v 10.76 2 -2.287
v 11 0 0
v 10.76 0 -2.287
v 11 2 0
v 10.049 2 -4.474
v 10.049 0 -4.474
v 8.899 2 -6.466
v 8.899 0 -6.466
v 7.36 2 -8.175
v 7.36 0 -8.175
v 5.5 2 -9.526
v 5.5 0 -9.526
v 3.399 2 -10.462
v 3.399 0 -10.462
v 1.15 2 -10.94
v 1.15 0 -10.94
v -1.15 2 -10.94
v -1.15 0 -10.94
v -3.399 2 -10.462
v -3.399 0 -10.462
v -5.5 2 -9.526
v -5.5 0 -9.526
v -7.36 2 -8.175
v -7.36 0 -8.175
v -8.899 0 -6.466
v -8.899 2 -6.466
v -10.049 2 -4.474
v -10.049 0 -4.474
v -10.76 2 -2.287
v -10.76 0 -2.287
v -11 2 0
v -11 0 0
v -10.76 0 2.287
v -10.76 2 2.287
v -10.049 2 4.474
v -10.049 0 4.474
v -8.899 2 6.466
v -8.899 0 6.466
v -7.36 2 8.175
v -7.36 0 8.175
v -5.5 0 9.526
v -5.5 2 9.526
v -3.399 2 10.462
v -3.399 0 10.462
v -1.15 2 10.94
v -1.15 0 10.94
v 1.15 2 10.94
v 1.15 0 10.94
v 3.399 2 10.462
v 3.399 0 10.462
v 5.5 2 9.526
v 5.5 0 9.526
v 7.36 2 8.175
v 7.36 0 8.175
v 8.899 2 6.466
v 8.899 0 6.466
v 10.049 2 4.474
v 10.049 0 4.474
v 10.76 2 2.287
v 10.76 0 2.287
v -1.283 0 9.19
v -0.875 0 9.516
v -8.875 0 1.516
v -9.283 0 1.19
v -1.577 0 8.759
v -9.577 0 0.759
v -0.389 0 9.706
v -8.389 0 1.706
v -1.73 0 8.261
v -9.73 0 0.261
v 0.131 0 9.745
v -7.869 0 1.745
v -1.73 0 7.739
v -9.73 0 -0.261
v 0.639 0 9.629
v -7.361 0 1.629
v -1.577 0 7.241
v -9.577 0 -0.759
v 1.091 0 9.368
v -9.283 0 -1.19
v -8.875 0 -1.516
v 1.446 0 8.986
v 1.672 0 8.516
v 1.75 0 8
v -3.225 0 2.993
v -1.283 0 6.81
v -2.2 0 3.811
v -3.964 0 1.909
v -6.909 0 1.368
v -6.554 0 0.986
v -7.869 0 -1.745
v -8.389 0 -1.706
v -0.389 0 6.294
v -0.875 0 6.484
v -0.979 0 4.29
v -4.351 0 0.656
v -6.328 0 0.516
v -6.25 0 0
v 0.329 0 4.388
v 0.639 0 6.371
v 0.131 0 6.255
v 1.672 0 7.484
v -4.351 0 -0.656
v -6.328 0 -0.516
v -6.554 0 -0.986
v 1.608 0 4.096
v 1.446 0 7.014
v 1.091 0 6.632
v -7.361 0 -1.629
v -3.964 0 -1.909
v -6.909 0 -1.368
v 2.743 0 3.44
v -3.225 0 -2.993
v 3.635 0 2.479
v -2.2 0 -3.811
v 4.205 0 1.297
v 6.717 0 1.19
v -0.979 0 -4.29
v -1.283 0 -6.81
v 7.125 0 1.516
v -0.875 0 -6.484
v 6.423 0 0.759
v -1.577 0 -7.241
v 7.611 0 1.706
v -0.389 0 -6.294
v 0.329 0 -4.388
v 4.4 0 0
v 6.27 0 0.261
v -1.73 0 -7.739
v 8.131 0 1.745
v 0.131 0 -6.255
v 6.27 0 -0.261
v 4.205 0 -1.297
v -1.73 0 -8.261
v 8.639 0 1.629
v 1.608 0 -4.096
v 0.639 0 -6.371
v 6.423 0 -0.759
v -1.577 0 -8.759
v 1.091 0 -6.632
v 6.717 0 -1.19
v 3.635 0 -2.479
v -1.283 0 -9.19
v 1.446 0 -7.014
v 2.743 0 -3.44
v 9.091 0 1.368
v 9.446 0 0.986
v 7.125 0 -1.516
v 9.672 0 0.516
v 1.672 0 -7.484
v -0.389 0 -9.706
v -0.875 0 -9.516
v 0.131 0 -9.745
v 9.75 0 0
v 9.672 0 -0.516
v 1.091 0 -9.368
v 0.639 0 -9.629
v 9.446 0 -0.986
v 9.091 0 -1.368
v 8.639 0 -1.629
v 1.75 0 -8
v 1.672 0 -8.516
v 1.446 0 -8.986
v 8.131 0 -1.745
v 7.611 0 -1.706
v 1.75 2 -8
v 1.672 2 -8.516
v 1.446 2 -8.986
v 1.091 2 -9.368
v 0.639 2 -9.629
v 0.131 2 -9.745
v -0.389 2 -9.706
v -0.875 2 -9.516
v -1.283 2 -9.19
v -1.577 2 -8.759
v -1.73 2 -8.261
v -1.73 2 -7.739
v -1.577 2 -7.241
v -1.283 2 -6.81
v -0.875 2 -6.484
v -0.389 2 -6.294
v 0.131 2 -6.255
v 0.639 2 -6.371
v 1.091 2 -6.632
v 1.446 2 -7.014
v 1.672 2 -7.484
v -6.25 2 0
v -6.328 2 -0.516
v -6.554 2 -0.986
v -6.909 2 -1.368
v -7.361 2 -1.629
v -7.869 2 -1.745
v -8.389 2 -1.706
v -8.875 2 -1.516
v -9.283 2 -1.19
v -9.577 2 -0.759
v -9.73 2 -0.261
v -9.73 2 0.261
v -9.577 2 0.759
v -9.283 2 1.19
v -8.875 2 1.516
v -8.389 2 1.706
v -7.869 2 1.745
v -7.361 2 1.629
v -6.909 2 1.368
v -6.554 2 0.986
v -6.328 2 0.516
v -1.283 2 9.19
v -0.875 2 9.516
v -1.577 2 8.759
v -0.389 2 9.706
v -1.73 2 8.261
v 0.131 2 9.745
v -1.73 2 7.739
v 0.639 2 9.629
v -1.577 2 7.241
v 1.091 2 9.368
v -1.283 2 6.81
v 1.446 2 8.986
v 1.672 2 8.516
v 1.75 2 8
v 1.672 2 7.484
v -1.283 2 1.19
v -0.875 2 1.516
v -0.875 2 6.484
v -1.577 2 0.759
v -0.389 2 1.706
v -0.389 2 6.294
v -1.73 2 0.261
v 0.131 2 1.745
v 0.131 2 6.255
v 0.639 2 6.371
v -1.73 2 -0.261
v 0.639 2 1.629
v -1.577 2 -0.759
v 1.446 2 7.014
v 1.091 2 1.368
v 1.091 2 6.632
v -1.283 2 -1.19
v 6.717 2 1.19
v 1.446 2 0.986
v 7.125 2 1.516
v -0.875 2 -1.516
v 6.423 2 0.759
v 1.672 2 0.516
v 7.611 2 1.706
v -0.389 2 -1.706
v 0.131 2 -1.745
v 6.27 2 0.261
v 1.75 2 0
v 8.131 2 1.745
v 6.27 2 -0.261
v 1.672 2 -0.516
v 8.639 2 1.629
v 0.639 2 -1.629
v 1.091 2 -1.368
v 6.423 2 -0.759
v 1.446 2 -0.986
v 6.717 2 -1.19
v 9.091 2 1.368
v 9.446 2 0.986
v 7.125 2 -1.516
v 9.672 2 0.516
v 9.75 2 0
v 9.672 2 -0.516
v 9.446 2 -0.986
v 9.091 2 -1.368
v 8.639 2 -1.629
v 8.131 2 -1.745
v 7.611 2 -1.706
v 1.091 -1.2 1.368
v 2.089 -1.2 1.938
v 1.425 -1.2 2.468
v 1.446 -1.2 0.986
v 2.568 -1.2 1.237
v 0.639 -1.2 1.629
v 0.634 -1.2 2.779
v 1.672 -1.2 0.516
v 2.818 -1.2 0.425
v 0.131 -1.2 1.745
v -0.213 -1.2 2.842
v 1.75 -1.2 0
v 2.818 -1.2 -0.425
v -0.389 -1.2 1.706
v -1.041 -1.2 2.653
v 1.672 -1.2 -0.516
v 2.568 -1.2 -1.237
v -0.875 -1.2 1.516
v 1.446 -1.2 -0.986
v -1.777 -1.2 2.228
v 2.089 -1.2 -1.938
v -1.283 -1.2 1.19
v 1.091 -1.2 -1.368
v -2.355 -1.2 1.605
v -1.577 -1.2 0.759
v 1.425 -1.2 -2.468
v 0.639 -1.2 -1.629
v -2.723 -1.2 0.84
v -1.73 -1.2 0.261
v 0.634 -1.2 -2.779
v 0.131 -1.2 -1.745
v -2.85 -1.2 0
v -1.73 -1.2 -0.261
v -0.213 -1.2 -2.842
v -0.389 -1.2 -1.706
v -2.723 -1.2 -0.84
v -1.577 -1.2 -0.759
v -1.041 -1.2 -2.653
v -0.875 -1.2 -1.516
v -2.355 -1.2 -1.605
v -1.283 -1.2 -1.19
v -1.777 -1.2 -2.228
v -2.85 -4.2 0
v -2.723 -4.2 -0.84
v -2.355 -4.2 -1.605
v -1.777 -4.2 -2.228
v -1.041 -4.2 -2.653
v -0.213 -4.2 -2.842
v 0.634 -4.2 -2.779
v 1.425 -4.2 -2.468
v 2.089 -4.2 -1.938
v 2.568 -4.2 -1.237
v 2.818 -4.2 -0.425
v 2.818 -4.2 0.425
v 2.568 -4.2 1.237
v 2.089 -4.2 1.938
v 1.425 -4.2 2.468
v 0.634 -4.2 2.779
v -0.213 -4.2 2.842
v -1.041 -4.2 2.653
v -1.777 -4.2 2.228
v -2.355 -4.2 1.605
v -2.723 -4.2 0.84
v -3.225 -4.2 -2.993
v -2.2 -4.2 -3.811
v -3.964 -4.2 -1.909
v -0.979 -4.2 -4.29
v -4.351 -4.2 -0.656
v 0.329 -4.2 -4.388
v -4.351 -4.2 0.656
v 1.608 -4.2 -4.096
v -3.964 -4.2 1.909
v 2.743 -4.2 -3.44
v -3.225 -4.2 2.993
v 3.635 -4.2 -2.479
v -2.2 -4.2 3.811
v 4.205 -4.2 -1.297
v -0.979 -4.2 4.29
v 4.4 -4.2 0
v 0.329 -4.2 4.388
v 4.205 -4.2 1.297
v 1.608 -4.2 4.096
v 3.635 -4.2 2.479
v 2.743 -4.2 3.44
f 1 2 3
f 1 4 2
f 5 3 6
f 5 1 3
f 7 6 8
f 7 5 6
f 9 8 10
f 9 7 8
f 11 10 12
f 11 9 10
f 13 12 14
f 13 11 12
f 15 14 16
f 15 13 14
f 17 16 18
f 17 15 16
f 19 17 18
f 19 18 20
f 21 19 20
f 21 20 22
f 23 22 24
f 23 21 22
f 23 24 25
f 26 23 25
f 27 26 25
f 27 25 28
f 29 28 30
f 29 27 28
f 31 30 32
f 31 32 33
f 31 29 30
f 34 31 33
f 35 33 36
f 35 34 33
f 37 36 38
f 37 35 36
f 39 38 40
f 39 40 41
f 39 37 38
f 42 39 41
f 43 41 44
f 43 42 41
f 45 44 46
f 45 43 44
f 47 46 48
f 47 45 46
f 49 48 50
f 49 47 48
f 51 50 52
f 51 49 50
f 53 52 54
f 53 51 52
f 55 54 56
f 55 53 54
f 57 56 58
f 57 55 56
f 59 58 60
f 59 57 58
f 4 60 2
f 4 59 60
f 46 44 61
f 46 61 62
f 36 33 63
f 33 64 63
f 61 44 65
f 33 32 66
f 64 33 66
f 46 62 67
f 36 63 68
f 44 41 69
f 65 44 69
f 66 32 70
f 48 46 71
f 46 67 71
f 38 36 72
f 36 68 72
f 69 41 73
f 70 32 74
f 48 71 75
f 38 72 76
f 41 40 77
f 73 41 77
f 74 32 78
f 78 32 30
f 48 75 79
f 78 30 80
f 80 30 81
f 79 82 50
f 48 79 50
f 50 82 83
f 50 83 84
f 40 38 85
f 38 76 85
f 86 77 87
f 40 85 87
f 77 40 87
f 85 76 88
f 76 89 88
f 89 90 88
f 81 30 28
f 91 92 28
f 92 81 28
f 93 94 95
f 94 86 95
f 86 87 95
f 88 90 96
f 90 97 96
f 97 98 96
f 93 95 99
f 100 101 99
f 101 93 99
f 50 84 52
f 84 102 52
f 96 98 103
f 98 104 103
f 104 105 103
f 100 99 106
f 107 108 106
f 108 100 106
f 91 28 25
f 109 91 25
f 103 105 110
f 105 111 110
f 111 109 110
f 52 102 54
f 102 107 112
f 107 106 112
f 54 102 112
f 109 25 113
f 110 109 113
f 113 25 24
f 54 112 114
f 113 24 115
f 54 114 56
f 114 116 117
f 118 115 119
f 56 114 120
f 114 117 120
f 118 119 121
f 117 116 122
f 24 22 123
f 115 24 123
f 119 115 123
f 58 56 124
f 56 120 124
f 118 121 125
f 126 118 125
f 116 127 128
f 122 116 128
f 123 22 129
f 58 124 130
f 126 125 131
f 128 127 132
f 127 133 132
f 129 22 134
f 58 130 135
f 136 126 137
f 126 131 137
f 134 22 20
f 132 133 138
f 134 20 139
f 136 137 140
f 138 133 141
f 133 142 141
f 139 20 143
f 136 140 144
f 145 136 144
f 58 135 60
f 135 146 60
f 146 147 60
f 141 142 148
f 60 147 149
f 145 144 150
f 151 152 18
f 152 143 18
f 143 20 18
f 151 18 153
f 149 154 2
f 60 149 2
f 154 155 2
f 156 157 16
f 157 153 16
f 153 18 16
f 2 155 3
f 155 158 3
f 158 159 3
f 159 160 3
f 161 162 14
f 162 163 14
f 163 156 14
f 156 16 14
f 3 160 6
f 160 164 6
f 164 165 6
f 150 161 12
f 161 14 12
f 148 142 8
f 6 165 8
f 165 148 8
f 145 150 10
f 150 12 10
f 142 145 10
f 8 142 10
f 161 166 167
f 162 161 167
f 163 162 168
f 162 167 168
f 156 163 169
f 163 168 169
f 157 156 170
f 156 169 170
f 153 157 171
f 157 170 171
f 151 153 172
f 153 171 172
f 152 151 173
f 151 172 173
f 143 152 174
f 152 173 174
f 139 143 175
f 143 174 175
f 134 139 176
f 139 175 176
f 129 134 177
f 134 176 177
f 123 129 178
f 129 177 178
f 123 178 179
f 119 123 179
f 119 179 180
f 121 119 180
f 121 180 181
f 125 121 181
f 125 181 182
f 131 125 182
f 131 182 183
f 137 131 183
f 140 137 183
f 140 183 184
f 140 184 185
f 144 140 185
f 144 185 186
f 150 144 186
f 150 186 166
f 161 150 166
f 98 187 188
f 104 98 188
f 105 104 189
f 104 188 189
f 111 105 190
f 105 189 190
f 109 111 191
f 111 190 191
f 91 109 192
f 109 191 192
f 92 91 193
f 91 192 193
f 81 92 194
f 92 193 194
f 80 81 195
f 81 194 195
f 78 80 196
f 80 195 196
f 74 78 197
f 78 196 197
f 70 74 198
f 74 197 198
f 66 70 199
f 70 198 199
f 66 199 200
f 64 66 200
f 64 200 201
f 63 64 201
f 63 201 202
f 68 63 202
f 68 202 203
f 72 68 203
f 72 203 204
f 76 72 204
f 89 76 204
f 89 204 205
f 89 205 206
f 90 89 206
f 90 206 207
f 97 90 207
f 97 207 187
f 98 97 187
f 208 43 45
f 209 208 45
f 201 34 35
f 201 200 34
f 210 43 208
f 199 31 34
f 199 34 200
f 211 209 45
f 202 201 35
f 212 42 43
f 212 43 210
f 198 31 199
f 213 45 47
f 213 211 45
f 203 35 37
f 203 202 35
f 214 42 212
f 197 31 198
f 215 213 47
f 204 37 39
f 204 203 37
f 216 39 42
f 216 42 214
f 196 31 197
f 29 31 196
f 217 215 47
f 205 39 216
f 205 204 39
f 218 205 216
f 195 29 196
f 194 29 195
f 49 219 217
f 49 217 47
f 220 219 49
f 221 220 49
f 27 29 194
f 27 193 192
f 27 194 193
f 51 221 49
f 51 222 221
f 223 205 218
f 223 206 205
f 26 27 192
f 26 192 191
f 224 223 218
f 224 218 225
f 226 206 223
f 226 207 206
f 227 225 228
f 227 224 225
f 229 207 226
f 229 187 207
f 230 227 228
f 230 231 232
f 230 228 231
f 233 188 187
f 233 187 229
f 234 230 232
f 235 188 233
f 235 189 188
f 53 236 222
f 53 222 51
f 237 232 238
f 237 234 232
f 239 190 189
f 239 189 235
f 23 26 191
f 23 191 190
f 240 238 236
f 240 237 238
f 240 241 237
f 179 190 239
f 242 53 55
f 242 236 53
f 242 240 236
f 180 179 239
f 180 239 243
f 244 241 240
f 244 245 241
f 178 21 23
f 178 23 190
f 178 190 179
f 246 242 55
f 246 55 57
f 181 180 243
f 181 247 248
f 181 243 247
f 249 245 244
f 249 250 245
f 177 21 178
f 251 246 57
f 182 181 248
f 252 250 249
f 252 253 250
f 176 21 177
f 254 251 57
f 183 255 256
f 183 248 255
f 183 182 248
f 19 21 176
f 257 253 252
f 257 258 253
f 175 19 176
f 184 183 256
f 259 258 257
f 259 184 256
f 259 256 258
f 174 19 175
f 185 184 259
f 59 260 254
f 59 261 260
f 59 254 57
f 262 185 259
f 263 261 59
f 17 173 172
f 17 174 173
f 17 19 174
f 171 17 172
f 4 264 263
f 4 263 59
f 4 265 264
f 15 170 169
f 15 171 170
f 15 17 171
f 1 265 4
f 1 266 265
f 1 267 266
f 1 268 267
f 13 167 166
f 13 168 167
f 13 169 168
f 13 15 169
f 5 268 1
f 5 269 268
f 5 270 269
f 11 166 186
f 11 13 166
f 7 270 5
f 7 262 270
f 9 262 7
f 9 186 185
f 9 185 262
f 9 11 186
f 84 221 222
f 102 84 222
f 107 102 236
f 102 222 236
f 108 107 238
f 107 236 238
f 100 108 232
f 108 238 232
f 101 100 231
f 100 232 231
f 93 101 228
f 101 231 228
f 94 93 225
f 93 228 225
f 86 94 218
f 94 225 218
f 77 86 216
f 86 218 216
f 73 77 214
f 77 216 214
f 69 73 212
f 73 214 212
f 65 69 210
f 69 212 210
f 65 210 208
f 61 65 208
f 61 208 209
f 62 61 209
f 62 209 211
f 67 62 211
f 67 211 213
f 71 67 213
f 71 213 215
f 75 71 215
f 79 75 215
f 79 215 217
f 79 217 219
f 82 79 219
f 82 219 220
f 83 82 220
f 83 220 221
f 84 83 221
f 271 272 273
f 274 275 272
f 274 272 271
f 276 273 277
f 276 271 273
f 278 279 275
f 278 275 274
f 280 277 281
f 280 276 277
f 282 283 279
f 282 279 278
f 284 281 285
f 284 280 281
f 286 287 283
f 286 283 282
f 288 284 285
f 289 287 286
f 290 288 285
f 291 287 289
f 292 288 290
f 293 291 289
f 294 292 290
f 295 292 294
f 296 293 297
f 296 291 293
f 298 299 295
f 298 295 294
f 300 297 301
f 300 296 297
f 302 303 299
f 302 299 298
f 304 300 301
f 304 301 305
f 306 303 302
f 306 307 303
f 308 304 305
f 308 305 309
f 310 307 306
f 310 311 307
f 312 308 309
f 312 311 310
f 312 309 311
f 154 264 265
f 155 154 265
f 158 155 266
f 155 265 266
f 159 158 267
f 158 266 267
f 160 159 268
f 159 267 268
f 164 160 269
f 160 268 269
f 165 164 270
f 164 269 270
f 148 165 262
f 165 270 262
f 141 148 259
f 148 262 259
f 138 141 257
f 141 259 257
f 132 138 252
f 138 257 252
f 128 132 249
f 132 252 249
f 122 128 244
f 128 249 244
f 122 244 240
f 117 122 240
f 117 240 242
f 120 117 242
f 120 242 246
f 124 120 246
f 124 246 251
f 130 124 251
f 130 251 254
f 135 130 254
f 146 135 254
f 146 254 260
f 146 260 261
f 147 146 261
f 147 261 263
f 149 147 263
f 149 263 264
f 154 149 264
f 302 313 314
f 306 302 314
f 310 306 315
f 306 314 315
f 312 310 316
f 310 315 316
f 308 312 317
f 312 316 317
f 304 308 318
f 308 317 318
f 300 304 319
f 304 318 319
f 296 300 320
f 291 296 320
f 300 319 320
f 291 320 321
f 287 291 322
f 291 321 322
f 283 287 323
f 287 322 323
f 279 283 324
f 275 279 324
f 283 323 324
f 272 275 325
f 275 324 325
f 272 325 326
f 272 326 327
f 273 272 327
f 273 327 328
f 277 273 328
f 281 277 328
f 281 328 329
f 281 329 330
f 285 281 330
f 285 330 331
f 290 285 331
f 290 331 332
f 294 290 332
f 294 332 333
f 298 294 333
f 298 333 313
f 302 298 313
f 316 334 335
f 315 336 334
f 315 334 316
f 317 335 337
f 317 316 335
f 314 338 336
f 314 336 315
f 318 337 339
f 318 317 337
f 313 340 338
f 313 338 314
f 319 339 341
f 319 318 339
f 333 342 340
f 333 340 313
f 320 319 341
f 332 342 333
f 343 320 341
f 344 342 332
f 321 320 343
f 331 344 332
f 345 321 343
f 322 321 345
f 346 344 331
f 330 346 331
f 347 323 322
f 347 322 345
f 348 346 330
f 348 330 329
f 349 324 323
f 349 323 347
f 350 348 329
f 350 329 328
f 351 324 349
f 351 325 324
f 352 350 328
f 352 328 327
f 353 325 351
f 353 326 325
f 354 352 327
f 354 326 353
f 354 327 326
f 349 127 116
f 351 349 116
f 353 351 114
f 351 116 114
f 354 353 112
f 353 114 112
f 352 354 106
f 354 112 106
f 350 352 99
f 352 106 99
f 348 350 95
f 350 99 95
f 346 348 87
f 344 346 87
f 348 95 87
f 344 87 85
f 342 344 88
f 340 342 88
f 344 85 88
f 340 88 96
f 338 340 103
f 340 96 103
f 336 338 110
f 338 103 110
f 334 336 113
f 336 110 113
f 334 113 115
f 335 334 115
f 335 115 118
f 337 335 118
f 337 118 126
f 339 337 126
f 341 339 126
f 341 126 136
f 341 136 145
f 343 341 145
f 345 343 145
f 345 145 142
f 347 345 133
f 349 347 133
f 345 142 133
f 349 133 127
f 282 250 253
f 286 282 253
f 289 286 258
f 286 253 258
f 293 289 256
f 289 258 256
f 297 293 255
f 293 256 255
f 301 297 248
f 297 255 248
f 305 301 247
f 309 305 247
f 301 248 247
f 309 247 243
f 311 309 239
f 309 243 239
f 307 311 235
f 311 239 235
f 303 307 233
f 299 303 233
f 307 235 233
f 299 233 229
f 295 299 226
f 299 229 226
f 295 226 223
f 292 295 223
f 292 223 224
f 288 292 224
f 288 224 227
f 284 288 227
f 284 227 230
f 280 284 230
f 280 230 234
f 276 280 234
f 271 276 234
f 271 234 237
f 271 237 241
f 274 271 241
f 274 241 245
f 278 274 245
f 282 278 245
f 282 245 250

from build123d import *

# Parameters (mm, degrees)
SKETCH1_W                                        = 11
SKETCH1_H                                        = 2
SKETCH2_R                                        = 4.4
BOSS_EXTRUDE1_DEPTH                              = 4.2
F_3_5_3_5_DIAMETER_HOLE1_D                       = 3.5
F_3_5_3_5_DIAMETER_HOLE1_DEPTH                   = 2
CBORE_FOR_M3_HEX_HEAD_MACHINE_SCREW1_D           = 3.5
CBORE_FOR_M3_HEX_HEAD_MACHINE_SCREW1_DEPTH       = 6.2
CBORE_FOR_M3_HEX_HEAD_MACHINE_SCREW1_CBORE_D     = 5.7
CBORE_FOR_M3_HEX_HEAD_MACHINE_SCREW1_CBORE_DEPTH = 3


with BuildPart() as part:
    # Sketch1 → Revolve1 (revolve)
    with BuildSketch(Plane(origin=(0, 0, 0), x_dir=(-1, 0, 0), z_dir=(0, 0, -1))):
        with Locations((-5.5, 1)):
            Rectangle(SKETCH1_W, SKETCH1_H)
    revolve(axis=Axis((0, 0, 0), (0, 1, 0)))

    # Sketch2 → Boss-Extrude1 (add)
    with BuildSketch(Plane.XZ):
        Circle(SKETCH2_R)
    extrude(amount=BOSS_EXTRUDE1_DEPTH)

    # Ø3.5 (3.5) Diameter Hole1
    with Locations(Plane(origin=(0, 0, 0), x_dir=(-1, 0, 0), z_dir=(0, -1, 0))):
        with Locations((-8, 0), (0, -8), (8, 0), (0, 8)):
            Hole(F_3_5_3_5_DIAMETER_HOLE1_D / 2, depth=F_3_5_3_5_DIAMETER_HOLE1_DEPTH)

    # CBORE for M3 Hex Head Machine Screw1
    with Locations(Plane(origin=(0, -4.2, 0), x_dir=(-1, 0, 0), z_dir=(0, -1, 0))):
        with Locations((0, 0)):
            CounterBoreHole(CBORE_FOR_M3_HEX_HEAD_MACHINE_SCREW1_D / 2, CBORE_FOR_M3_HEX_HEAD_MACHINE_SCREW1_CBORE_D / 2, CBORE_FOR_M3_HEX_HEAD_MACHINE_SCREW1_CBORE_DEPTH, depth=CBORE_FOR_M3_HEX_HEAD_MACHINE_SCREW1_DEPTH)


solid = part.part
